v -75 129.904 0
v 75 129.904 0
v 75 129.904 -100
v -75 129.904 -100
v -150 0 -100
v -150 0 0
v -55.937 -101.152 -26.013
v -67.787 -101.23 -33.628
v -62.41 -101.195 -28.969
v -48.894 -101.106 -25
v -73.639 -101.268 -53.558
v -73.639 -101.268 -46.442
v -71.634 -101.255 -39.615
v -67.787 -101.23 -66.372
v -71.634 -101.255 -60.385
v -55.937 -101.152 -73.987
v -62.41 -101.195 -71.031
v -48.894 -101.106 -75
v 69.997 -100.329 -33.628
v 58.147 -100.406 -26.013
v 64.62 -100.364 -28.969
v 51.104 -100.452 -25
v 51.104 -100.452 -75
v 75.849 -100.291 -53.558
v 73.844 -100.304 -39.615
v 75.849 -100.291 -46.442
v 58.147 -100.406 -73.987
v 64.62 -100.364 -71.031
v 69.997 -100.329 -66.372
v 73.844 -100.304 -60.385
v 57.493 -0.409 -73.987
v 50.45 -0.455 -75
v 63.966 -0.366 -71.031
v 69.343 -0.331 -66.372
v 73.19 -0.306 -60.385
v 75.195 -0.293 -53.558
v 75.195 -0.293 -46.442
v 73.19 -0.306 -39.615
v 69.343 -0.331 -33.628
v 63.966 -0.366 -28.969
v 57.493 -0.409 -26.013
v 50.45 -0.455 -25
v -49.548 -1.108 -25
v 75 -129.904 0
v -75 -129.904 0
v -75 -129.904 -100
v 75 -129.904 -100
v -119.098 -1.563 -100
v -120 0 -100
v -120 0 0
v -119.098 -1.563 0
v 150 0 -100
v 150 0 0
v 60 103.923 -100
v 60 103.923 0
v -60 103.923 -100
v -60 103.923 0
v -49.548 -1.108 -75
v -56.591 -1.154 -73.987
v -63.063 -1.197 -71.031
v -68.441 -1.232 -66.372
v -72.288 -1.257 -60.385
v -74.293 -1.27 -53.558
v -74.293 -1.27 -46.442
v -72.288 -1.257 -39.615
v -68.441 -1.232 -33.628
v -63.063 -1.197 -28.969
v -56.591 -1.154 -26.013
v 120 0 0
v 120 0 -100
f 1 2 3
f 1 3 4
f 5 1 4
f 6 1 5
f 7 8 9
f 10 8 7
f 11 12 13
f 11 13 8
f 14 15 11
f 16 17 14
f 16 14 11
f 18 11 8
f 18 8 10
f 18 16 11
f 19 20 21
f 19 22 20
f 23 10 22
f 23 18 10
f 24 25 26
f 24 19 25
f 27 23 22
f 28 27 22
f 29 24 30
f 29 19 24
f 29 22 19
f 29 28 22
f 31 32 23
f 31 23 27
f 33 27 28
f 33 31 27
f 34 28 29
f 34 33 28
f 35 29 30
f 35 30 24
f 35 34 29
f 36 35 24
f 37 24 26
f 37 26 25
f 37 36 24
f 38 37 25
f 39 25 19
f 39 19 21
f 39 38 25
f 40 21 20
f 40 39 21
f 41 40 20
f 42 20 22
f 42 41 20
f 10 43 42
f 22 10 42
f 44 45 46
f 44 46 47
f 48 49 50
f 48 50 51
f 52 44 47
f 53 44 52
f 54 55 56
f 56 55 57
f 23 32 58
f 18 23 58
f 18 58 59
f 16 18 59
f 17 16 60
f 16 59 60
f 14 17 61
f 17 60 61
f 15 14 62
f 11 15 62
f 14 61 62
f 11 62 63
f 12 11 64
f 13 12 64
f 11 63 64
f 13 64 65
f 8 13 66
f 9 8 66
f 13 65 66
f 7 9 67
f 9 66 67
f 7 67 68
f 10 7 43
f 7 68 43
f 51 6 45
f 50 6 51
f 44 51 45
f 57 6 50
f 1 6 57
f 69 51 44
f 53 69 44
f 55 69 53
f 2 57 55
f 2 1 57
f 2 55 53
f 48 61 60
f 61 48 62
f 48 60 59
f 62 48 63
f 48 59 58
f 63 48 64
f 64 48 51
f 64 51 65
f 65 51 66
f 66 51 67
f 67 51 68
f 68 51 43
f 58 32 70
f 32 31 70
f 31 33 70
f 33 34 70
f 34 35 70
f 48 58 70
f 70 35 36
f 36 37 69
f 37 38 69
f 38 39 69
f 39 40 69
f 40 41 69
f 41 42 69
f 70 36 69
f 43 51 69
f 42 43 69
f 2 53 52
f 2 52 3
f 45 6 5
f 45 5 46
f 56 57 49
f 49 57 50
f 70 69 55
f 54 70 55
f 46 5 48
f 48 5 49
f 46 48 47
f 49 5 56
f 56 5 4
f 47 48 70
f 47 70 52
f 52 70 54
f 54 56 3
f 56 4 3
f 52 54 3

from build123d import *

# Parameters (mm, degrees)
BOSS_EXTRUDE1_DEPTH = 100
CUT_EXTRUDE1_DEPTH  = 100
CUT_EXTRUDE2_DEPTH  = 100


with BuildPart() as part:
    # Sketch1 → Boss-Extrude1 (new body)
    with BuildSketch(Plane.XY):
        Polygon((150, 0), (75, 129.903810568), (-75, 129.903810568), (-150, 0), (-75, -129.903810568), (75, -129.903810568), align=None)
    extrude(amount=-BOSS_EXTRUDE1_DEPTH)

    # Sketch2 → Cut-Extrude1 (cut)
    with BuildSketch(Plane.XY):
        Polygon((-120, 0), (-119.097636783, -1.562938939), (120, 0), (60, 103.923048454), (-60, 103.923048454), align=None)
    extrude(amount=-CUT_EXTRUDE1_DEPTH, mode=Mode.SUBTRACT)

    # Sketch3 → Cut-Extrude2 (cut)
    with BuildSketch(Plane(origin=(0.005127388, -0.784385247, 0), x_dir=(0.9999786356570095, 0.006536683375074496, 0), z_dir=(-0.006536683375074496, 0.9999786356570095, 0))):
        with BuildLine():
            Line((0.446063751, 75), (-49.553936249, 75))
            ThreePointArc((-49.553936249, 75), (-74.553936249, 50), (-49.553936249, 25))
            Line((-49.553936249, 25), (0.446063751, 25))
            ThreePointArc((0.446063751, 25), (-24.553936249, 50), (0.446063751, 75))
        make_face()
        with BuildLine():
            Line((0.446063751, 25), (0.446063751, 75))
            ThreePointArc((0.446063751, 75), (-24.553936249, 50), (0.446063751, 25))
        make_face()
        with BuildLine():
            ThreePointArc((0.446063751, 25), (25.446063751, 50), (0.446063751, 75))
            Line((0.446063751, 75), (0.446063751, 25))
        make_face()
        with BuildLine():
            ThreePointArc((0.446063751, 25), (25.446063751, 50), (0.446063751, 75))
            Line((0.446063751, 75), (50.446063751, 75))
            ThreePointArc((50.446063751, 75), (75.446063751, 50), (50.446063751, 25))
            Line((50.446063751, 25), (0.446063751, 25))
        make_face()
    extrude(amount=-CUT_EXTRUDE2_DEPTH, mode=Mode.SUBTRACT)


solid = part.part
